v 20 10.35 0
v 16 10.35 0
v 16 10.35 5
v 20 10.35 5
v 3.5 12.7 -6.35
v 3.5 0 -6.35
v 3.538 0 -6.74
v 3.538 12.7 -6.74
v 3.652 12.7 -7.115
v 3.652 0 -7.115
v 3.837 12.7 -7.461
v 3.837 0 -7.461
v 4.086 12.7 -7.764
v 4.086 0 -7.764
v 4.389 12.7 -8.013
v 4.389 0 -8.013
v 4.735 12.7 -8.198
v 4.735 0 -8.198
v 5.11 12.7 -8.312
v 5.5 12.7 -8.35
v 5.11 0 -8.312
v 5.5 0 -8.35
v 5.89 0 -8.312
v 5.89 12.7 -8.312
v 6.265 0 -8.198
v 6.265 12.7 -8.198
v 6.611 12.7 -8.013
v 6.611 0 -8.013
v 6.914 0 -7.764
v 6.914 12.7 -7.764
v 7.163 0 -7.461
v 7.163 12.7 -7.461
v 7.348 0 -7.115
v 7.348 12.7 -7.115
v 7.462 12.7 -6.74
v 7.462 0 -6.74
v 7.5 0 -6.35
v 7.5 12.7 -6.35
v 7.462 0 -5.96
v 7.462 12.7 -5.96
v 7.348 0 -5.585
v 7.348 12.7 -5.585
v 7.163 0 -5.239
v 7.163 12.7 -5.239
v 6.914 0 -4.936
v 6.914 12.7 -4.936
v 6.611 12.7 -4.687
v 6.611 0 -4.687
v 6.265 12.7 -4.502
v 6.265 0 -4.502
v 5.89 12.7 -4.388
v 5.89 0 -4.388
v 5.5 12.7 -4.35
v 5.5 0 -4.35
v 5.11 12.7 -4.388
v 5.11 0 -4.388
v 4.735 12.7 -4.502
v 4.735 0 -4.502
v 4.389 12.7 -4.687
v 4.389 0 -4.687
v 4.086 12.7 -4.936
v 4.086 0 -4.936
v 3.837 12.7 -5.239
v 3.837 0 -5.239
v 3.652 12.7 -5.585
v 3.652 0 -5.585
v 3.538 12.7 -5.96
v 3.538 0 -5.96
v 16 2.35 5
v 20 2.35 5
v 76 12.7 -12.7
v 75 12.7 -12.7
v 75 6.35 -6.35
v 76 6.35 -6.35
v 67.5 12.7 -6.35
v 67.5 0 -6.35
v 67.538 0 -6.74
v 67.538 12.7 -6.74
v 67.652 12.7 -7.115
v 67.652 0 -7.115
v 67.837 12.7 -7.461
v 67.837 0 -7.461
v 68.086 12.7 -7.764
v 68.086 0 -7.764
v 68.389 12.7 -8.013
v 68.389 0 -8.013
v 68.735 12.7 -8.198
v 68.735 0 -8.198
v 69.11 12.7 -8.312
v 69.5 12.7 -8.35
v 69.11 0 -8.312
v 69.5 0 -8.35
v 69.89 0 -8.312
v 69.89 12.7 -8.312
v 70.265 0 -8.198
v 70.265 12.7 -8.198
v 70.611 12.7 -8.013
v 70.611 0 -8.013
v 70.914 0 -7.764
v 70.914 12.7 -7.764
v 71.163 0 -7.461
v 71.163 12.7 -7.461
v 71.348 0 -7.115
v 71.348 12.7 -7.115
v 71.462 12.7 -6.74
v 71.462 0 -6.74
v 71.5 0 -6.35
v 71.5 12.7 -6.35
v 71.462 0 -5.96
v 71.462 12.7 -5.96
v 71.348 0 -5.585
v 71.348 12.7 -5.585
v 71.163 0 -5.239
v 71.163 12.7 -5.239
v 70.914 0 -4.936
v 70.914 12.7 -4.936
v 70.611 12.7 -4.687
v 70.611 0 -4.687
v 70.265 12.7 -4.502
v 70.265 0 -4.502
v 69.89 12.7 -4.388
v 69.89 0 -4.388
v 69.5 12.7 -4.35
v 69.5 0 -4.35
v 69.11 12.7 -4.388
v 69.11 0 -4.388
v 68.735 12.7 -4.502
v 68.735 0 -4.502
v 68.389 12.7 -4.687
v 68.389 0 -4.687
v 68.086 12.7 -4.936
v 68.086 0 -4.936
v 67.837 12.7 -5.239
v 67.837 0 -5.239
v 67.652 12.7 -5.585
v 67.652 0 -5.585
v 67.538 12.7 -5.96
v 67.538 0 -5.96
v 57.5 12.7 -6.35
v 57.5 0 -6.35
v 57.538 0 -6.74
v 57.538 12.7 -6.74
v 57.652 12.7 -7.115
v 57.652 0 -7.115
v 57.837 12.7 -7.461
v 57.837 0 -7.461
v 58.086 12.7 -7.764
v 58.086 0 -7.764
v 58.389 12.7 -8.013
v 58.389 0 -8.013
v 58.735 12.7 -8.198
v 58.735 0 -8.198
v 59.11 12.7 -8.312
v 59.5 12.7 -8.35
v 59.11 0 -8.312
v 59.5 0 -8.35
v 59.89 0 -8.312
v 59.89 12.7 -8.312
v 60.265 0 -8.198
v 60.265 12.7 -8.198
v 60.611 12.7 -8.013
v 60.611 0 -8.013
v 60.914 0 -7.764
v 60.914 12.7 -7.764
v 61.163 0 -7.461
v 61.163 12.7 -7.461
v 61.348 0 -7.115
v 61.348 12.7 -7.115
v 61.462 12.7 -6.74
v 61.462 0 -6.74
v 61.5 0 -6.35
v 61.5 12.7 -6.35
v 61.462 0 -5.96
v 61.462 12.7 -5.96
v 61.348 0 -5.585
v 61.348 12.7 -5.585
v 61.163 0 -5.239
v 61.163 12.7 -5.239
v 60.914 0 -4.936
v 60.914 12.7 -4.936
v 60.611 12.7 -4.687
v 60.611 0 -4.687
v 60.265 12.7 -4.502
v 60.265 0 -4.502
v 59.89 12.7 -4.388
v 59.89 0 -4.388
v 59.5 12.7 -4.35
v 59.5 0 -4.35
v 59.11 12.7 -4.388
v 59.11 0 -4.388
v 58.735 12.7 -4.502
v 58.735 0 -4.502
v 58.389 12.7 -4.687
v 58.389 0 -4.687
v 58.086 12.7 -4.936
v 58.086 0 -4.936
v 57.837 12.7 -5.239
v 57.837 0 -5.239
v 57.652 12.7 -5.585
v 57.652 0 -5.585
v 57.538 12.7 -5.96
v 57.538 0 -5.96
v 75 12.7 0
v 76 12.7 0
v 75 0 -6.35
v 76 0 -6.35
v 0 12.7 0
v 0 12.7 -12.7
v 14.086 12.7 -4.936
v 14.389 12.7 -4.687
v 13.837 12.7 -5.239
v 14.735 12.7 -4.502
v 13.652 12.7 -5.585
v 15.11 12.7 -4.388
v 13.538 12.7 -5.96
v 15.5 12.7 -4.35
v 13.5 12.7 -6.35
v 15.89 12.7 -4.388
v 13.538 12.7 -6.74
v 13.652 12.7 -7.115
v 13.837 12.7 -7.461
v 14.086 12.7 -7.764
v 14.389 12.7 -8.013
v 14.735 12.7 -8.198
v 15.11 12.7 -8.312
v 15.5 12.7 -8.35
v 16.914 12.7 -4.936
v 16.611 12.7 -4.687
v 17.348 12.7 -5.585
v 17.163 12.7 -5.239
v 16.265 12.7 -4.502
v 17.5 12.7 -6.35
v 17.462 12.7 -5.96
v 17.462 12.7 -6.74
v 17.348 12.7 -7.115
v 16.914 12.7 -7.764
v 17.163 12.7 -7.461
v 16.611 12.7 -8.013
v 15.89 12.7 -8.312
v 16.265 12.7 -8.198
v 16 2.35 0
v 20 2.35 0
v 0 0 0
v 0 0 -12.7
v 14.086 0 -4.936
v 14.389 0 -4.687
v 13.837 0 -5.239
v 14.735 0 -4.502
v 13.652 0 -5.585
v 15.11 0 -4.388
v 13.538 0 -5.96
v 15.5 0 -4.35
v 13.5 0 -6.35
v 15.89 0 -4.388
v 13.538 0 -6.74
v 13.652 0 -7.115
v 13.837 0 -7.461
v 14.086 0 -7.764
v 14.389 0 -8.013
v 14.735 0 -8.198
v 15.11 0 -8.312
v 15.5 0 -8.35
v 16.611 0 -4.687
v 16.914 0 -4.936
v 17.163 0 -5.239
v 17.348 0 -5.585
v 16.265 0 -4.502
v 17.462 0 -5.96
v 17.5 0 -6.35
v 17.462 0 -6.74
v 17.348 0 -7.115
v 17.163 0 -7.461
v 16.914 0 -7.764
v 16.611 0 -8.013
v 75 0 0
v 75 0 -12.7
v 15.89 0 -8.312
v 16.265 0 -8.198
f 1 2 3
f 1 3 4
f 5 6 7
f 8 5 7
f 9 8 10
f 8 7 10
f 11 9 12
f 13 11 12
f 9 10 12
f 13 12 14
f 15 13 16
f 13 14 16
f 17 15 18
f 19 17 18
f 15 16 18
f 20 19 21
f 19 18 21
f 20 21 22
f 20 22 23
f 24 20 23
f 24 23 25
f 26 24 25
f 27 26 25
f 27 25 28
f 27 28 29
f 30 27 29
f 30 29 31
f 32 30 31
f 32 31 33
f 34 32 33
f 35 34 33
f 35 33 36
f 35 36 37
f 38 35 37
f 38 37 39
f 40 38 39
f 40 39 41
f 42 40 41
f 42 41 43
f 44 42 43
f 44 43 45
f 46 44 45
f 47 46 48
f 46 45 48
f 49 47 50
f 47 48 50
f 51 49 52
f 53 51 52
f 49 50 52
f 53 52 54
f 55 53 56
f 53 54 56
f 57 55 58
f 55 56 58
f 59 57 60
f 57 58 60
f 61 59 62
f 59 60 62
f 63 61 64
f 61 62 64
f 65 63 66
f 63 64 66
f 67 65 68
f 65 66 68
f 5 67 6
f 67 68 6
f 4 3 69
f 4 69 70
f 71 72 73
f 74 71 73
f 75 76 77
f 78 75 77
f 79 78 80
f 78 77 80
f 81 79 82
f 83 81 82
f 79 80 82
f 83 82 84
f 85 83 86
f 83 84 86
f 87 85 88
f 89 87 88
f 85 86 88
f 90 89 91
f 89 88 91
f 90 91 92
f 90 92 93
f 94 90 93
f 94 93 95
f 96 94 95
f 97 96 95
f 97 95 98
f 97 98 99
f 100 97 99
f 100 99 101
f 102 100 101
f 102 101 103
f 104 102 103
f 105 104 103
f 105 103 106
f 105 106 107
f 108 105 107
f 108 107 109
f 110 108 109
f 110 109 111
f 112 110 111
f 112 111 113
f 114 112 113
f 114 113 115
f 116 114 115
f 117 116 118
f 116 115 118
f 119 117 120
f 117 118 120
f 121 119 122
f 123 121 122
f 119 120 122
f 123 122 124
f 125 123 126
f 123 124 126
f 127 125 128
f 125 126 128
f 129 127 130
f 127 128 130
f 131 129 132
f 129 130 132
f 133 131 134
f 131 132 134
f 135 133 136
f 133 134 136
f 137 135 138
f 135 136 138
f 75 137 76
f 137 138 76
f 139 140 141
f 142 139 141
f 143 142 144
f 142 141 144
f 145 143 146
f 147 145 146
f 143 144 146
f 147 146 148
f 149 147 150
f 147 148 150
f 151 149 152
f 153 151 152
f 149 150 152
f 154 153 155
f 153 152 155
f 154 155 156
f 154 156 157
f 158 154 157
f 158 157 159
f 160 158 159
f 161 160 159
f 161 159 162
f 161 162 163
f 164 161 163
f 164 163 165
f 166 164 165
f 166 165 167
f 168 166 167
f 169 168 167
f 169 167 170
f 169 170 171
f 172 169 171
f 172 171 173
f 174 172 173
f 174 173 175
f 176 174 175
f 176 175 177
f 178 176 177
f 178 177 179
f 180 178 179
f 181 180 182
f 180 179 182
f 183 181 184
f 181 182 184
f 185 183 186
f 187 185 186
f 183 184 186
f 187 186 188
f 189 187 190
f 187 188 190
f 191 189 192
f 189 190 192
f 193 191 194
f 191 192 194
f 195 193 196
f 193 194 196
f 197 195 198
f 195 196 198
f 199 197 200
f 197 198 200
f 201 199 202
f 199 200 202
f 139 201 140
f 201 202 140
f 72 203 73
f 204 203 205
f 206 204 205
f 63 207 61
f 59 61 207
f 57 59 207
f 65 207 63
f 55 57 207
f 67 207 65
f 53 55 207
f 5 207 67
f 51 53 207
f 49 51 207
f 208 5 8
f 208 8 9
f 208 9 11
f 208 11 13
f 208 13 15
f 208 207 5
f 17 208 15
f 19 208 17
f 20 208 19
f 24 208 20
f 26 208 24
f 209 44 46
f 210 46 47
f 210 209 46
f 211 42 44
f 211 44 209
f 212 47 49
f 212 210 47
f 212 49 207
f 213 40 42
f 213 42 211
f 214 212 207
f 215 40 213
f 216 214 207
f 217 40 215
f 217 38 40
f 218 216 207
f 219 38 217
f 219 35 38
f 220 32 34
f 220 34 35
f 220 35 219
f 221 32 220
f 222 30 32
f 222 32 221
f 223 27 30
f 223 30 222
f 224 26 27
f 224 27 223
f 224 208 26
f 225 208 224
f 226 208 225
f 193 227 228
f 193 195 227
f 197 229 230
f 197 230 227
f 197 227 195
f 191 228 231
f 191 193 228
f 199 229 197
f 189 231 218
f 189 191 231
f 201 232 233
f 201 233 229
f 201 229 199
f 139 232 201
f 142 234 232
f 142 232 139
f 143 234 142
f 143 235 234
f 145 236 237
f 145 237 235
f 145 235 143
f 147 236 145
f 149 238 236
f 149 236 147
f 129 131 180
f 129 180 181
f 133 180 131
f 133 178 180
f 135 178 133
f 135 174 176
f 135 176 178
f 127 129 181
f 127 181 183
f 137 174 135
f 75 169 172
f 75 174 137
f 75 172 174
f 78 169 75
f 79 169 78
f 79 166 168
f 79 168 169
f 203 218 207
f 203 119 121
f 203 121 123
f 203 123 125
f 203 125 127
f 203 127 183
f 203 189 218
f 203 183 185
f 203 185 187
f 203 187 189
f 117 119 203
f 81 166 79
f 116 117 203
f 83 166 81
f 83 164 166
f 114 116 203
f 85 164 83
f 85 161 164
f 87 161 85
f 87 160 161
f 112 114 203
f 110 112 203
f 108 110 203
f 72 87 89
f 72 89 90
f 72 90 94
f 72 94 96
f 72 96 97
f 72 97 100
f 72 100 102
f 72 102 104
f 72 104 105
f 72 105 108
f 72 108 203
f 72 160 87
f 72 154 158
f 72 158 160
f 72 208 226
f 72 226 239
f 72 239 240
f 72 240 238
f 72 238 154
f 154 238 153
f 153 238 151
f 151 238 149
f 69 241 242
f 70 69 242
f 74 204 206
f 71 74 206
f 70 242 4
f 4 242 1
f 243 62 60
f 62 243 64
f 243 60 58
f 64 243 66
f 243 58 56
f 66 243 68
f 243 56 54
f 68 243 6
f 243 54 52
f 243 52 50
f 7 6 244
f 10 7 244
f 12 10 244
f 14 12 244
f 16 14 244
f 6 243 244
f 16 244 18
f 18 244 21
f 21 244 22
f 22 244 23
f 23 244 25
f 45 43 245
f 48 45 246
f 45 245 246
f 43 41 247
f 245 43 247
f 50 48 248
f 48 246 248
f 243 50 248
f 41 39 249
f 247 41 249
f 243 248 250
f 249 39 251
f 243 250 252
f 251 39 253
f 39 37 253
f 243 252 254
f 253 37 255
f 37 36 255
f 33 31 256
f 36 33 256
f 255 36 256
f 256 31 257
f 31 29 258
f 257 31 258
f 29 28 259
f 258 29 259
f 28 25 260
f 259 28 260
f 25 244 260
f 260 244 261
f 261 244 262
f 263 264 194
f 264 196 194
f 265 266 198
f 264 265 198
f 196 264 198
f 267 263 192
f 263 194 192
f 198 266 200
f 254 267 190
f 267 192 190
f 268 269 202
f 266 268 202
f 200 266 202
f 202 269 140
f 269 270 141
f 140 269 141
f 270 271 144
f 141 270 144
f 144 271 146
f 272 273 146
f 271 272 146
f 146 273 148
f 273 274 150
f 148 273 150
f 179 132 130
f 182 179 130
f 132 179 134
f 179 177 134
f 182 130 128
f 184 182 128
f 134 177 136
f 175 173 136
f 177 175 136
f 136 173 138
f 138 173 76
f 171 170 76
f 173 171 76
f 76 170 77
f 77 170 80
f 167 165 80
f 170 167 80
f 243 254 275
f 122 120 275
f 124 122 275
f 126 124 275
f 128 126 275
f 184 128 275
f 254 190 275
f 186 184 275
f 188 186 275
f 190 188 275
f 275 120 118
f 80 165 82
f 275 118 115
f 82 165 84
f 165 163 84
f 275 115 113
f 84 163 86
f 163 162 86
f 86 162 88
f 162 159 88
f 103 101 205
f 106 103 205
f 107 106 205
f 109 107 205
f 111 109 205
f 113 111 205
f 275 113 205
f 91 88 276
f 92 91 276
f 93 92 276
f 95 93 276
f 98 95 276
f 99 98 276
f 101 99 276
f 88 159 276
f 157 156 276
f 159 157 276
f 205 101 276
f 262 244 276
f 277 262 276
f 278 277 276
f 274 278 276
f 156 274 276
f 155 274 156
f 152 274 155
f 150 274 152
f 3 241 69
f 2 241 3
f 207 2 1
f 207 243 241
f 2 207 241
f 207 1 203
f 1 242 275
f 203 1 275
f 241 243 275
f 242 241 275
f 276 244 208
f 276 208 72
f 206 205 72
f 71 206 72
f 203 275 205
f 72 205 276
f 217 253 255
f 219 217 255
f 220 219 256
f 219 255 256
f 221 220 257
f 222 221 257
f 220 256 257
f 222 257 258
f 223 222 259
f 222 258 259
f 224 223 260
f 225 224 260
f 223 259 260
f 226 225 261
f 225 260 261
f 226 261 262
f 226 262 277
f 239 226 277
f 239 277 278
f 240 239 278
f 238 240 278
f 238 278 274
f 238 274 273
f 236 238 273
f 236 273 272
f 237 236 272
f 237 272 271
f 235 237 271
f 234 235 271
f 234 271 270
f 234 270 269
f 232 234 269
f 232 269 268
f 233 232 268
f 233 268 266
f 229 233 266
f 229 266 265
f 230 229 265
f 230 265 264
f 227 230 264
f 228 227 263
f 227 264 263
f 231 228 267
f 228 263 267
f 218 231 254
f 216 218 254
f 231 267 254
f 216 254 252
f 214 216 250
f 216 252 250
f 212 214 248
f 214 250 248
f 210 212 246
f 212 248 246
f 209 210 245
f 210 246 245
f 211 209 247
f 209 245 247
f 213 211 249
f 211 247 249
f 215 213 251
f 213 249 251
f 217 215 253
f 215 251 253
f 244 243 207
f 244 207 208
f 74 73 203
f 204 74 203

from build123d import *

# Parameters (mm, degrees)
SKETCH1_W                 = 75
SKETCH1_H                 = 12.7
BOSS_EXTRUDE1_DEPTH       = 12.7
F_4_0MM_DOWEL_HOLE1_D     = 4
F_4_0MM_DOWEL_HOLE1_DEPTH = 117.6291
F_4_0MM_DOWEL_HOLE1_TIP   = 1.201721238
SKETCH4_W                 = 4
SKETCH4_H                 = 8
BOSS_EXTRUDE2_DEPTH       = 5
BOSS_EXTRUDE3_DEPTH       = 1


with BuildPart() as part:
    # Sketch1 → Boss-Extrude1 (new body)
    with BuildSketch(Plane(origin=(0, 0, 0), x_dir=(1, 0, 0), z_dir=(0, 1, 0))):
        with Locations((37.5, 6.35)):
            Rectangle(SKETCH1_W, SKETCH1_H)
    extrude(amount=BOSS_EXTRUDE1_DEPTH)

    # Ø4.0mm Dowel Hole1
    with Locations(Plane(origin=(0, 12.7, 0), x_dir=(1, 0, 0), z_dir=(0, 1, 0))):
        with Locations((69.5, 6.35), (59.5, 6.35), (5.5, 6.35), (15.5, 6.35)):
            Hole(F_4_0MM_DOWEL_HOLE1_D / 2, depth=F_4_0MM_DOWEL_HOLE1_DEPTH)
            with Locations((0, 0, -(F_4_0MM_DOWEL_HOLE1_DEPTH + F_4_0MM_DOWEL_HOLE1_TIP / 2))):  # 118° drill point
                Cone(0, F_4_0MM_DOWEL_HOLE1_D / 2, F_4_0MM_DOWEL_HOLE1_TIP, mode=Mode.SUBTRACT)

    # Sketch4 → Boss-Extrude2 (add)
    with BuildSketch(Plane.XY):
        with Locations((18, 6.35)):
            Rectangle(SKETCH4_W, SKETCH4_H)
    extrude(amount=BOSS_EXTRUDE2_DEPTH)

    # Sketch6 → Boss-Extrude3 (add)
    with BuildSketch(Plane(origin=(75, 0, 0), x_dir=(0, 0, -1), z_dir=(1, 0, 0))):
        Polygon((6.35, 0), (12.7, 12.7), (6.35, 6.35), (0, 12.7), align=None)
    extrude(amount=BOSS_EXTRUDE3_DEPTH)


solid = part.part
